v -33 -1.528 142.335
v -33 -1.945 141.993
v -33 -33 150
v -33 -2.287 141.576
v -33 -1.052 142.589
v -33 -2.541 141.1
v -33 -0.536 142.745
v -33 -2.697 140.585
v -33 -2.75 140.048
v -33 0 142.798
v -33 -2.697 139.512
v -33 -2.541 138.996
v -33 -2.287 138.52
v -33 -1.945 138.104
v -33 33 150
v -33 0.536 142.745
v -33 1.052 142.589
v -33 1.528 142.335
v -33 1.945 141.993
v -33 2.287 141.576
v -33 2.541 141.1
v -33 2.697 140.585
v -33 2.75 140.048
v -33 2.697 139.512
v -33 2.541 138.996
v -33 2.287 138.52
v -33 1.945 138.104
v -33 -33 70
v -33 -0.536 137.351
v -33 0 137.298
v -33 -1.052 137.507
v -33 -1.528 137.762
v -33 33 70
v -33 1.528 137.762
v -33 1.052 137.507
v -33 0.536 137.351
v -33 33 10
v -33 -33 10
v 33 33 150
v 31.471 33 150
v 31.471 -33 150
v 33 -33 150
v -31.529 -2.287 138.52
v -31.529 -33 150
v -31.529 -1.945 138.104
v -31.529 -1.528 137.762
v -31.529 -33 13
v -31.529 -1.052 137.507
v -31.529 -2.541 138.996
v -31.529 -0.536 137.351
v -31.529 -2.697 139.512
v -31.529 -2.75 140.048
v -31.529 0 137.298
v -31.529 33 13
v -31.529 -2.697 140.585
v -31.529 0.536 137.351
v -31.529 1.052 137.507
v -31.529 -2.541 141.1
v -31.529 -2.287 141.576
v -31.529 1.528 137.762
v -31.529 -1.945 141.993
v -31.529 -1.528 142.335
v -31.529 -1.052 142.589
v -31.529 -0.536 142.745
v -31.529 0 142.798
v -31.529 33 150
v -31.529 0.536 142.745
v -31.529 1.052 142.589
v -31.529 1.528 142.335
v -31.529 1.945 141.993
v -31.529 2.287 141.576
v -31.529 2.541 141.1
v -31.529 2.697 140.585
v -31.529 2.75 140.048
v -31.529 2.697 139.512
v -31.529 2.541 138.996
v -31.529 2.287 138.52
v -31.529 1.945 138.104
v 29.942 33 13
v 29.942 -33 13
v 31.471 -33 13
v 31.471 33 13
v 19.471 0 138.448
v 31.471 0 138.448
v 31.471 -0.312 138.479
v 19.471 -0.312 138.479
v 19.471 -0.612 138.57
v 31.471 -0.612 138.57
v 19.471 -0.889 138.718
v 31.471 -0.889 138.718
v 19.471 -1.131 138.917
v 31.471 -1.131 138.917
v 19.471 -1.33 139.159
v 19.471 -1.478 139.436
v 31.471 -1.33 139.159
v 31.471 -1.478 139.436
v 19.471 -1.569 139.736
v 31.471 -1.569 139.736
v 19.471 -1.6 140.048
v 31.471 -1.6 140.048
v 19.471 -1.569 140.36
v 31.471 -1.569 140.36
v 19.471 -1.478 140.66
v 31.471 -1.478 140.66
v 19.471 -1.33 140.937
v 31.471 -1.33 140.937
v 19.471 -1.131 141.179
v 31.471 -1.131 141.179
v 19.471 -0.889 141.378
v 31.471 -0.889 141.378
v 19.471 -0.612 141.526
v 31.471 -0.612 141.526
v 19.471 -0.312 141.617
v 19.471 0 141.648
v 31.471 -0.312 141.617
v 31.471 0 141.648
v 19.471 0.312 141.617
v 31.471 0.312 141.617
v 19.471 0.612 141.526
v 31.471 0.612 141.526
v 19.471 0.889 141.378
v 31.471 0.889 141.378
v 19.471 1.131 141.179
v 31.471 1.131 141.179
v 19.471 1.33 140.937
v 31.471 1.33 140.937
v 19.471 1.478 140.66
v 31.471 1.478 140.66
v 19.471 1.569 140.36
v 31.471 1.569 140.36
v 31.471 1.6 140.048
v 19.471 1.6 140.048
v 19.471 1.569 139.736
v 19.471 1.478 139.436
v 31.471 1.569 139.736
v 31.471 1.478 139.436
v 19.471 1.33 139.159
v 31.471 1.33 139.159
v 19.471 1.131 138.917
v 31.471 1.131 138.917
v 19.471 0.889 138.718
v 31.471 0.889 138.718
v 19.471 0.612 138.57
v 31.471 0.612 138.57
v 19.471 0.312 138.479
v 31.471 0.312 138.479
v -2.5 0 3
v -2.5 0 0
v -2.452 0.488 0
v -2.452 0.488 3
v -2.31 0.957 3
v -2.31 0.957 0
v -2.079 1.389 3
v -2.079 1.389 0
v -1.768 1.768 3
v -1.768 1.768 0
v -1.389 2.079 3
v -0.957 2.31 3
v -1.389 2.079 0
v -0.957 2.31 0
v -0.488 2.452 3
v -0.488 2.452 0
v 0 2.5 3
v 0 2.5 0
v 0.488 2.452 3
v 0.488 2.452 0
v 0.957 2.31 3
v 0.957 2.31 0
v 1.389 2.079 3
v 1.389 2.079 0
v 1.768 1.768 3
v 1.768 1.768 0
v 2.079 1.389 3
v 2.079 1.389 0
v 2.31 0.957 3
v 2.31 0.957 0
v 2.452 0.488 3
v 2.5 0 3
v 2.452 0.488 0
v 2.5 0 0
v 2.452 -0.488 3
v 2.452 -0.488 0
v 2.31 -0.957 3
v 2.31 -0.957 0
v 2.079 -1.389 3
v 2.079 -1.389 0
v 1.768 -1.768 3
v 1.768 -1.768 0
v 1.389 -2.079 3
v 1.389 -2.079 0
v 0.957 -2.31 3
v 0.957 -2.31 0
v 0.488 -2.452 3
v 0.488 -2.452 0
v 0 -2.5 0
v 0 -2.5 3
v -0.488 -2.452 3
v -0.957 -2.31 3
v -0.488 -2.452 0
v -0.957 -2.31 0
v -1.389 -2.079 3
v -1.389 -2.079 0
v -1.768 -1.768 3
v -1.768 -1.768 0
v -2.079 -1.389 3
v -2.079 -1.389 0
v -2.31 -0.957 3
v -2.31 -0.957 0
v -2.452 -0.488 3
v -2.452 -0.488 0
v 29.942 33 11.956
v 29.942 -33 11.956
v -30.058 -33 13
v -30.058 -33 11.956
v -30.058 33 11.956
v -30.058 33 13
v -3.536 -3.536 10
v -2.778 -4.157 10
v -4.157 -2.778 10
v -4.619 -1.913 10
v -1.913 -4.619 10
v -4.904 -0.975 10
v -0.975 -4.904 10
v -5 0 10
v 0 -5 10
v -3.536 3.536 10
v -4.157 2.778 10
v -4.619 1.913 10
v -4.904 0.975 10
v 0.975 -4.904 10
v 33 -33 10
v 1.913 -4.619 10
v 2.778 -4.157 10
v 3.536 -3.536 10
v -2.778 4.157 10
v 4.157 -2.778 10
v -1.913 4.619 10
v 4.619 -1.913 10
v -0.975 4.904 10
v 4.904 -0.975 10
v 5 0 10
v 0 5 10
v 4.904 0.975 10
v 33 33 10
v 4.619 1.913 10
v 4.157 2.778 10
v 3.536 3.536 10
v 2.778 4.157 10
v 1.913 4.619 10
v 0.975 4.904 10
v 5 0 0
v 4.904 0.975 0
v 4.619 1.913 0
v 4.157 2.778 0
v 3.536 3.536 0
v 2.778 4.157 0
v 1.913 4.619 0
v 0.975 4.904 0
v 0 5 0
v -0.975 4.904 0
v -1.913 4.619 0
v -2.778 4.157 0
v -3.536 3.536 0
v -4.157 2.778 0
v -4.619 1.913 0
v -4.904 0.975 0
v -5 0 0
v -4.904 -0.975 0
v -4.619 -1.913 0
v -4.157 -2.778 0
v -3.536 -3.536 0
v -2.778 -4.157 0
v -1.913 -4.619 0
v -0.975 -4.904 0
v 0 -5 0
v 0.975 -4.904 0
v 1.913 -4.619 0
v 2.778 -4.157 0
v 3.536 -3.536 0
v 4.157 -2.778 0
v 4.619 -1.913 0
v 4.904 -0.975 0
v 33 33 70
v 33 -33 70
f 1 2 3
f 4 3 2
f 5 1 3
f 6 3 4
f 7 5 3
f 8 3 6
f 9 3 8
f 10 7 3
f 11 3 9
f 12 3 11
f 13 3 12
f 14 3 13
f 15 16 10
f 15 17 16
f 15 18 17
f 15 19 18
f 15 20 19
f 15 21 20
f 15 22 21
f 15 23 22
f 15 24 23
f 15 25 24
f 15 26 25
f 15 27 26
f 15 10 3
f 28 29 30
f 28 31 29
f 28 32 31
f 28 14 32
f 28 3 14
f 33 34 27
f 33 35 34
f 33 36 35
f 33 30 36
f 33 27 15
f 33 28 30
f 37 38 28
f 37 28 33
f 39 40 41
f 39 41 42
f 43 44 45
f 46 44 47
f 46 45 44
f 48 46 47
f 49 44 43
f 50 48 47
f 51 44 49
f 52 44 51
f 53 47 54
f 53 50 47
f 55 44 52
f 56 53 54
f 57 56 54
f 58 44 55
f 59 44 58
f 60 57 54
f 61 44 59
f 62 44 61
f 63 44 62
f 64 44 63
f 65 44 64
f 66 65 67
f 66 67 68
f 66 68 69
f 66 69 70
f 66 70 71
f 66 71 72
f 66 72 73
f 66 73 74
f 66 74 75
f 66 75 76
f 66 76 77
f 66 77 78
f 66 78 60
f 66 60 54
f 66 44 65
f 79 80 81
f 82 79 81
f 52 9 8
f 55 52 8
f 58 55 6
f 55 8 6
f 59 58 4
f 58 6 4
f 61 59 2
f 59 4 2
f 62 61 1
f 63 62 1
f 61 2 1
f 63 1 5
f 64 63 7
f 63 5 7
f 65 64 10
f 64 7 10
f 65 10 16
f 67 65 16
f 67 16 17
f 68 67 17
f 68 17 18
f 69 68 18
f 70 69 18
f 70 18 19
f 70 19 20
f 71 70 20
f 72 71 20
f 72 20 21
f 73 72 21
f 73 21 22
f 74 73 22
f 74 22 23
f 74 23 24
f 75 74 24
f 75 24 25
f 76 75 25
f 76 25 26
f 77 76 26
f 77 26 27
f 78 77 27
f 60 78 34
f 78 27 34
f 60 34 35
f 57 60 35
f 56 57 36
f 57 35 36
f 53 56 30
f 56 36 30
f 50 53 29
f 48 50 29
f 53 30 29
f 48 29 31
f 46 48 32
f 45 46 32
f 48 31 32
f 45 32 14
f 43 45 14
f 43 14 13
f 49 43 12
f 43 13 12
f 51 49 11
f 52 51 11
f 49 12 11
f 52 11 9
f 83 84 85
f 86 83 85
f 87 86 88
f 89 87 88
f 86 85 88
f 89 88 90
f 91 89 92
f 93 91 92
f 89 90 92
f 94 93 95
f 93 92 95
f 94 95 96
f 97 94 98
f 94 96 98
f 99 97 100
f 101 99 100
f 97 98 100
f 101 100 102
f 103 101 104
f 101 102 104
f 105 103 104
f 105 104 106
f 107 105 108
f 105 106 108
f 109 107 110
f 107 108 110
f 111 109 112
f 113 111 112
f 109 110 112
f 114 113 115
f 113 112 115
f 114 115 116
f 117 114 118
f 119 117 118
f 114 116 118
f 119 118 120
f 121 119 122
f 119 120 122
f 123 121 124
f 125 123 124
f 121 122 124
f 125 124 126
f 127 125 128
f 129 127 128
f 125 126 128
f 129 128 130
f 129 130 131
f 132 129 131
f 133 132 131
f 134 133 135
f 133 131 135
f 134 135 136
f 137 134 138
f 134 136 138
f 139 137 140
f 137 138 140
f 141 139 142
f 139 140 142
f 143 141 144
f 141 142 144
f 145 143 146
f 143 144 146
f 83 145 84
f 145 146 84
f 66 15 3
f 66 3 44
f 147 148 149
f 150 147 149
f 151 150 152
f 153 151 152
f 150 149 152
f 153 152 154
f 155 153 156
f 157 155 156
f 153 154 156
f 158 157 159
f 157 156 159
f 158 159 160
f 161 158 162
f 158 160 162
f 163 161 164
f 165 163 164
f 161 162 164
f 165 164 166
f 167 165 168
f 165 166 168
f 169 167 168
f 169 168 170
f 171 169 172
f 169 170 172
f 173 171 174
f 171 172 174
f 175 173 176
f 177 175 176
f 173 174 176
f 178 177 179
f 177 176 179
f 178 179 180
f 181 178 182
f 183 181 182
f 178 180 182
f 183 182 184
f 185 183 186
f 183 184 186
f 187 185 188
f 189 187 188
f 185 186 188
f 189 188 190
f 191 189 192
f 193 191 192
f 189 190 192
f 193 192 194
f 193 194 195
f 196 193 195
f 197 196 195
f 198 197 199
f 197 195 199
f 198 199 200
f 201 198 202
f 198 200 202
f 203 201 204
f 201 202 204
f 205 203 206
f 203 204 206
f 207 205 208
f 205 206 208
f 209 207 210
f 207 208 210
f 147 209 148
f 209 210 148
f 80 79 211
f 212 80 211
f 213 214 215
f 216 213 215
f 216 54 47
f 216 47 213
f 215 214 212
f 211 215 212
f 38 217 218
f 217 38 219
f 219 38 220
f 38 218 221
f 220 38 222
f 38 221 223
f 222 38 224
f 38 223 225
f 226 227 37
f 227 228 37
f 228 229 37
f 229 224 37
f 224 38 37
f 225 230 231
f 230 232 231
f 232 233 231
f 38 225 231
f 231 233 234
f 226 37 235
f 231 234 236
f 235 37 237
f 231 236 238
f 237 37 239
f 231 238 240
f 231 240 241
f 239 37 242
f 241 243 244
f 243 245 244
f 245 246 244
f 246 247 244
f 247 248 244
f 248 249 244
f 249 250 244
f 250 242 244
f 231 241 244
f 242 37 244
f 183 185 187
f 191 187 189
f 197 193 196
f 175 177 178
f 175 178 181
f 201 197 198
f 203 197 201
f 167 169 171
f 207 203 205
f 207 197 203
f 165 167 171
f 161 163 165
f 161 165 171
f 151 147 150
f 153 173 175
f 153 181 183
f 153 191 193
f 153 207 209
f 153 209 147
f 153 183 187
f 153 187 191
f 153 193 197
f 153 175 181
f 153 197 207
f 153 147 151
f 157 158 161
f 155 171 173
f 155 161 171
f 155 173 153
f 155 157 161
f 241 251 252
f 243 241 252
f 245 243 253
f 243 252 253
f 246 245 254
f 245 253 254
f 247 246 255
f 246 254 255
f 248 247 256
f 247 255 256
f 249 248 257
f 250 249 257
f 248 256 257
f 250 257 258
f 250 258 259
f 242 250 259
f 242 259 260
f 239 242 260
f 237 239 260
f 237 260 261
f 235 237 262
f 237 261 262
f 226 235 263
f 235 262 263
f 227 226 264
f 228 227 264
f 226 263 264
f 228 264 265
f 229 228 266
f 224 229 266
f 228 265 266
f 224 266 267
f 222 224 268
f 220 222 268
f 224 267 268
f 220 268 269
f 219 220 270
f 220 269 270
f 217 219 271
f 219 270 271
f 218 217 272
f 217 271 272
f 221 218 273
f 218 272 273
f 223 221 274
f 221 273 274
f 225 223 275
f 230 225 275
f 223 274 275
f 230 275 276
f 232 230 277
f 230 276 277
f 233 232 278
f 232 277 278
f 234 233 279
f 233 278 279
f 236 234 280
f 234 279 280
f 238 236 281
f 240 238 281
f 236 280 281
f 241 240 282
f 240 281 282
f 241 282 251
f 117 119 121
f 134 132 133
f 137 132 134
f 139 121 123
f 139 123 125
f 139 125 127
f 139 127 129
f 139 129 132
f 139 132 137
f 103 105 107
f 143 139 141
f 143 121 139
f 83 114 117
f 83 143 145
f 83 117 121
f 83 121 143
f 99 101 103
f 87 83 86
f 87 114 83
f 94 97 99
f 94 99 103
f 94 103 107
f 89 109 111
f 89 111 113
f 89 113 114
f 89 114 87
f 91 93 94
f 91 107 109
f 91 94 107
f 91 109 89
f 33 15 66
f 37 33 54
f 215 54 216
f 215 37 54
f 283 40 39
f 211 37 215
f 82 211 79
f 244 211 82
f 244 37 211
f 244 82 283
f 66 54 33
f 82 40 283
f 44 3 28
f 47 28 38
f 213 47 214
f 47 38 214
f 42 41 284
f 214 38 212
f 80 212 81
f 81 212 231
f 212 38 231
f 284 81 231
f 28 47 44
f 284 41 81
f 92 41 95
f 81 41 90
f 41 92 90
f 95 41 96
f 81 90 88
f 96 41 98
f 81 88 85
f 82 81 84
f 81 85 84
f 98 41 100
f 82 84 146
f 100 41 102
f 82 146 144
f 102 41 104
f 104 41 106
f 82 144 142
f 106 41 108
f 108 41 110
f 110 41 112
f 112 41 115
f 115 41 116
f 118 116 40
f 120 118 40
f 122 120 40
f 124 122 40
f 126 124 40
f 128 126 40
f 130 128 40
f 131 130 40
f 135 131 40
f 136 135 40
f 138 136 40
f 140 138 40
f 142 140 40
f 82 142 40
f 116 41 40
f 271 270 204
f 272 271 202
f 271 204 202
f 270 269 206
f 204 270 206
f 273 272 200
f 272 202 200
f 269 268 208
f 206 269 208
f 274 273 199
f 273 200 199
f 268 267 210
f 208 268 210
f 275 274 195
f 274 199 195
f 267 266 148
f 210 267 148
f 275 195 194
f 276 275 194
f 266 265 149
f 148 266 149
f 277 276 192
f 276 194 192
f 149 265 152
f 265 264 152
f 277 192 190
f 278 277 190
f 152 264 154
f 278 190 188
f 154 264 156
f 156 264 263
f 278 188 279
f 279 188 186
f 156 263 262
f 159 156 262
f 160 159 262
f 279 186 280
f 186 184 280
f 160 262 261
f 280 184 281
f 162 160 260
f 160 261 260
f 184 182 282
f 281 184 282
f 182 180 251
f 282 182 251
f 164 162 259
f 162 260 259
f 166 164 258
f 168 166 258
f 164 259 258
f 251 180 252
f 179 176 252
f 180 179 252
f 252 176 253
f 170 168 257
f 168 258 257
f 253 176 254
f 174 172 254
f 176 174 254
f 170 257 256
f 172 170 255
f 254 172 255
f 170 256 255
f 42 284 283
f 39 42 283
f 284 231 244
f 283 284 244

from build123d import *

# Parameters (mm, degrees)
ESBO_O1_R                = 5
RESSALTO_EXTRUS_O2_DEPTH = 10
ESBO_O3_R                = 2.5
CORTE_EXTRUS_O2_DEPTH    = 3
ESBO_O4_W                = 66
ESBO_O4_H                = 66
RESSALTO_EXTRUS_O3_DEPTH = 60
ESBO_O5_W                = 60
ESBO_O5_H                = 63
CORTE_EXTRUS_O3_DEPTH    = 57
ESBO_O6_W                = 60
ESBO_O6_H                = 59
CORTE_EXTRUS_O5_DEPTH    = 84
ESBO_O7_W                = 2.941982117
ESBO_O7_H                = 66
ESBO_O7_W_2              = 3.058017883
RESSALTO_EXTRUS_O4_DEPTH = 80
ESBO_O8_W                = 1.470991058
ESBO_O8_H                = 66
ESBO_O8_W_2              = 1.529008942
CORTE_EXTRUS_O6_DEPTH    = 137
ESBO_O9_R                = 2.75
CORTE_EXTRUS_O7_DEPTH    = 49
ESBO_O10_R               = 1.6
RESSALTO_EXTRUS_O5_DEPTH = 12


with BuildPart() as part:
    # Esboço1 → Ressalto-extrusão2 (new body)
    with BuildSketch(Plane.XY):
        Circle(ESBO_O1_R)
    extrude(amount=RESSALTO_EXTRUS_O2_DEPTH)

    # Esboço3 → Corte-extrusão2 (cut)
    with BuildSketch(Plane(origin=(0, 0, 0), x_dir=(-1, 0, 0), z_dir=(0, 0, -1))):
        Circle(ESBO_O3_R)
    extrude(amount=-CORTE_EXTRUS_O2_DEPTH, mode=Mode.SUBTRACT)

    # Esboço4 → Ressalto-extrusão3 (add)
    with BuildSketch(Plane.XY.offset(10)):
        Rectangle(ESBO_O4_W, ESBO_O4_H)
    extrude(amount=RESSALTO_EXTRUS_O3_DEPTH)

    # Esboço5 → Corte-extrusão3 (cut)
    with BuildSketch(Plane.XY.offset(70)):
        Rectangle(ESBO_O5_W, ESBO_O5_H)
    extrude(amount=-CORTE_EXTRUS_O3_DEPTH, mode=Mode.SUBTRACT)

    # Esboço6 → Corte-extrusão5 (cut)
    with BuildSketch(Plane(origin=(0, 33, 0), x_dir=(1, 0, 0), z_dir=(0, 1, 0))):
        with Locations((-0.058017883, -41.456168944)):
            Rectangle(ESBO_O6_W, ESBO_O6_H)
    extrude(amount=-CORTE_EXTRUS_O5_DEPTH, mode=Mode.SUBTRACT)

    # Esboço7 → Ressalto-extrusão4 (add)
    with BuildSketch(Plane.XY.offset(70)):
        with Locations((-31.529008942, 0)):
            Rectangle(ESBO_O7_W, ESBO_O7_H)
        with Locations((31.470991059, 0)):
            Rectangle(ESBO_O7_W_2, ESBO_O7_H)
    extrude(amount=RESSALTO_EXTRUS_O4_DEPTH)

    # Esboço8 → Corte-extrusão6 (cut)
    with BuildSketch(Plane.XY.offset(150)):
        with Locations((-30.793513412, 0)):
            Rectangle(ESBO_O8_W, ESBO_O8_H)
        with Locations((30.706486588, 0)):
            Rectangle(ESBO_O8_W_2, ESBO_O8_H)
    extrude(amount=-CORTE_EXTRUS_O6_DEPTH, mode=Mode.SUBTRACT)

    # Esboço9 → Corte-extrusão7 (cut)
    with BuildSketch(Plane.ZY.offset(33)):
        with Locations(Location((140.048047336, 0, 0), (0, 0, 270))):
            Circle(ESBO_O9_R)
    extrude(amount=-CORTE_EXTRUS_O7_DEPTH, mode=Mode.SUBTRACT)

    # Esboço10 → Ressalto-extrusão5 (add)
    with BuildSketch(Plane.ZY.offset(-31.470991059)):
        with Locations(Location((140.048047336, 0, 0), (0, 0, 180))):
            Circle(ESBO_O10_R)
    extrude(amount=RESSALTO_EXTRUS_O5_DEPTH)


solid = part.part
